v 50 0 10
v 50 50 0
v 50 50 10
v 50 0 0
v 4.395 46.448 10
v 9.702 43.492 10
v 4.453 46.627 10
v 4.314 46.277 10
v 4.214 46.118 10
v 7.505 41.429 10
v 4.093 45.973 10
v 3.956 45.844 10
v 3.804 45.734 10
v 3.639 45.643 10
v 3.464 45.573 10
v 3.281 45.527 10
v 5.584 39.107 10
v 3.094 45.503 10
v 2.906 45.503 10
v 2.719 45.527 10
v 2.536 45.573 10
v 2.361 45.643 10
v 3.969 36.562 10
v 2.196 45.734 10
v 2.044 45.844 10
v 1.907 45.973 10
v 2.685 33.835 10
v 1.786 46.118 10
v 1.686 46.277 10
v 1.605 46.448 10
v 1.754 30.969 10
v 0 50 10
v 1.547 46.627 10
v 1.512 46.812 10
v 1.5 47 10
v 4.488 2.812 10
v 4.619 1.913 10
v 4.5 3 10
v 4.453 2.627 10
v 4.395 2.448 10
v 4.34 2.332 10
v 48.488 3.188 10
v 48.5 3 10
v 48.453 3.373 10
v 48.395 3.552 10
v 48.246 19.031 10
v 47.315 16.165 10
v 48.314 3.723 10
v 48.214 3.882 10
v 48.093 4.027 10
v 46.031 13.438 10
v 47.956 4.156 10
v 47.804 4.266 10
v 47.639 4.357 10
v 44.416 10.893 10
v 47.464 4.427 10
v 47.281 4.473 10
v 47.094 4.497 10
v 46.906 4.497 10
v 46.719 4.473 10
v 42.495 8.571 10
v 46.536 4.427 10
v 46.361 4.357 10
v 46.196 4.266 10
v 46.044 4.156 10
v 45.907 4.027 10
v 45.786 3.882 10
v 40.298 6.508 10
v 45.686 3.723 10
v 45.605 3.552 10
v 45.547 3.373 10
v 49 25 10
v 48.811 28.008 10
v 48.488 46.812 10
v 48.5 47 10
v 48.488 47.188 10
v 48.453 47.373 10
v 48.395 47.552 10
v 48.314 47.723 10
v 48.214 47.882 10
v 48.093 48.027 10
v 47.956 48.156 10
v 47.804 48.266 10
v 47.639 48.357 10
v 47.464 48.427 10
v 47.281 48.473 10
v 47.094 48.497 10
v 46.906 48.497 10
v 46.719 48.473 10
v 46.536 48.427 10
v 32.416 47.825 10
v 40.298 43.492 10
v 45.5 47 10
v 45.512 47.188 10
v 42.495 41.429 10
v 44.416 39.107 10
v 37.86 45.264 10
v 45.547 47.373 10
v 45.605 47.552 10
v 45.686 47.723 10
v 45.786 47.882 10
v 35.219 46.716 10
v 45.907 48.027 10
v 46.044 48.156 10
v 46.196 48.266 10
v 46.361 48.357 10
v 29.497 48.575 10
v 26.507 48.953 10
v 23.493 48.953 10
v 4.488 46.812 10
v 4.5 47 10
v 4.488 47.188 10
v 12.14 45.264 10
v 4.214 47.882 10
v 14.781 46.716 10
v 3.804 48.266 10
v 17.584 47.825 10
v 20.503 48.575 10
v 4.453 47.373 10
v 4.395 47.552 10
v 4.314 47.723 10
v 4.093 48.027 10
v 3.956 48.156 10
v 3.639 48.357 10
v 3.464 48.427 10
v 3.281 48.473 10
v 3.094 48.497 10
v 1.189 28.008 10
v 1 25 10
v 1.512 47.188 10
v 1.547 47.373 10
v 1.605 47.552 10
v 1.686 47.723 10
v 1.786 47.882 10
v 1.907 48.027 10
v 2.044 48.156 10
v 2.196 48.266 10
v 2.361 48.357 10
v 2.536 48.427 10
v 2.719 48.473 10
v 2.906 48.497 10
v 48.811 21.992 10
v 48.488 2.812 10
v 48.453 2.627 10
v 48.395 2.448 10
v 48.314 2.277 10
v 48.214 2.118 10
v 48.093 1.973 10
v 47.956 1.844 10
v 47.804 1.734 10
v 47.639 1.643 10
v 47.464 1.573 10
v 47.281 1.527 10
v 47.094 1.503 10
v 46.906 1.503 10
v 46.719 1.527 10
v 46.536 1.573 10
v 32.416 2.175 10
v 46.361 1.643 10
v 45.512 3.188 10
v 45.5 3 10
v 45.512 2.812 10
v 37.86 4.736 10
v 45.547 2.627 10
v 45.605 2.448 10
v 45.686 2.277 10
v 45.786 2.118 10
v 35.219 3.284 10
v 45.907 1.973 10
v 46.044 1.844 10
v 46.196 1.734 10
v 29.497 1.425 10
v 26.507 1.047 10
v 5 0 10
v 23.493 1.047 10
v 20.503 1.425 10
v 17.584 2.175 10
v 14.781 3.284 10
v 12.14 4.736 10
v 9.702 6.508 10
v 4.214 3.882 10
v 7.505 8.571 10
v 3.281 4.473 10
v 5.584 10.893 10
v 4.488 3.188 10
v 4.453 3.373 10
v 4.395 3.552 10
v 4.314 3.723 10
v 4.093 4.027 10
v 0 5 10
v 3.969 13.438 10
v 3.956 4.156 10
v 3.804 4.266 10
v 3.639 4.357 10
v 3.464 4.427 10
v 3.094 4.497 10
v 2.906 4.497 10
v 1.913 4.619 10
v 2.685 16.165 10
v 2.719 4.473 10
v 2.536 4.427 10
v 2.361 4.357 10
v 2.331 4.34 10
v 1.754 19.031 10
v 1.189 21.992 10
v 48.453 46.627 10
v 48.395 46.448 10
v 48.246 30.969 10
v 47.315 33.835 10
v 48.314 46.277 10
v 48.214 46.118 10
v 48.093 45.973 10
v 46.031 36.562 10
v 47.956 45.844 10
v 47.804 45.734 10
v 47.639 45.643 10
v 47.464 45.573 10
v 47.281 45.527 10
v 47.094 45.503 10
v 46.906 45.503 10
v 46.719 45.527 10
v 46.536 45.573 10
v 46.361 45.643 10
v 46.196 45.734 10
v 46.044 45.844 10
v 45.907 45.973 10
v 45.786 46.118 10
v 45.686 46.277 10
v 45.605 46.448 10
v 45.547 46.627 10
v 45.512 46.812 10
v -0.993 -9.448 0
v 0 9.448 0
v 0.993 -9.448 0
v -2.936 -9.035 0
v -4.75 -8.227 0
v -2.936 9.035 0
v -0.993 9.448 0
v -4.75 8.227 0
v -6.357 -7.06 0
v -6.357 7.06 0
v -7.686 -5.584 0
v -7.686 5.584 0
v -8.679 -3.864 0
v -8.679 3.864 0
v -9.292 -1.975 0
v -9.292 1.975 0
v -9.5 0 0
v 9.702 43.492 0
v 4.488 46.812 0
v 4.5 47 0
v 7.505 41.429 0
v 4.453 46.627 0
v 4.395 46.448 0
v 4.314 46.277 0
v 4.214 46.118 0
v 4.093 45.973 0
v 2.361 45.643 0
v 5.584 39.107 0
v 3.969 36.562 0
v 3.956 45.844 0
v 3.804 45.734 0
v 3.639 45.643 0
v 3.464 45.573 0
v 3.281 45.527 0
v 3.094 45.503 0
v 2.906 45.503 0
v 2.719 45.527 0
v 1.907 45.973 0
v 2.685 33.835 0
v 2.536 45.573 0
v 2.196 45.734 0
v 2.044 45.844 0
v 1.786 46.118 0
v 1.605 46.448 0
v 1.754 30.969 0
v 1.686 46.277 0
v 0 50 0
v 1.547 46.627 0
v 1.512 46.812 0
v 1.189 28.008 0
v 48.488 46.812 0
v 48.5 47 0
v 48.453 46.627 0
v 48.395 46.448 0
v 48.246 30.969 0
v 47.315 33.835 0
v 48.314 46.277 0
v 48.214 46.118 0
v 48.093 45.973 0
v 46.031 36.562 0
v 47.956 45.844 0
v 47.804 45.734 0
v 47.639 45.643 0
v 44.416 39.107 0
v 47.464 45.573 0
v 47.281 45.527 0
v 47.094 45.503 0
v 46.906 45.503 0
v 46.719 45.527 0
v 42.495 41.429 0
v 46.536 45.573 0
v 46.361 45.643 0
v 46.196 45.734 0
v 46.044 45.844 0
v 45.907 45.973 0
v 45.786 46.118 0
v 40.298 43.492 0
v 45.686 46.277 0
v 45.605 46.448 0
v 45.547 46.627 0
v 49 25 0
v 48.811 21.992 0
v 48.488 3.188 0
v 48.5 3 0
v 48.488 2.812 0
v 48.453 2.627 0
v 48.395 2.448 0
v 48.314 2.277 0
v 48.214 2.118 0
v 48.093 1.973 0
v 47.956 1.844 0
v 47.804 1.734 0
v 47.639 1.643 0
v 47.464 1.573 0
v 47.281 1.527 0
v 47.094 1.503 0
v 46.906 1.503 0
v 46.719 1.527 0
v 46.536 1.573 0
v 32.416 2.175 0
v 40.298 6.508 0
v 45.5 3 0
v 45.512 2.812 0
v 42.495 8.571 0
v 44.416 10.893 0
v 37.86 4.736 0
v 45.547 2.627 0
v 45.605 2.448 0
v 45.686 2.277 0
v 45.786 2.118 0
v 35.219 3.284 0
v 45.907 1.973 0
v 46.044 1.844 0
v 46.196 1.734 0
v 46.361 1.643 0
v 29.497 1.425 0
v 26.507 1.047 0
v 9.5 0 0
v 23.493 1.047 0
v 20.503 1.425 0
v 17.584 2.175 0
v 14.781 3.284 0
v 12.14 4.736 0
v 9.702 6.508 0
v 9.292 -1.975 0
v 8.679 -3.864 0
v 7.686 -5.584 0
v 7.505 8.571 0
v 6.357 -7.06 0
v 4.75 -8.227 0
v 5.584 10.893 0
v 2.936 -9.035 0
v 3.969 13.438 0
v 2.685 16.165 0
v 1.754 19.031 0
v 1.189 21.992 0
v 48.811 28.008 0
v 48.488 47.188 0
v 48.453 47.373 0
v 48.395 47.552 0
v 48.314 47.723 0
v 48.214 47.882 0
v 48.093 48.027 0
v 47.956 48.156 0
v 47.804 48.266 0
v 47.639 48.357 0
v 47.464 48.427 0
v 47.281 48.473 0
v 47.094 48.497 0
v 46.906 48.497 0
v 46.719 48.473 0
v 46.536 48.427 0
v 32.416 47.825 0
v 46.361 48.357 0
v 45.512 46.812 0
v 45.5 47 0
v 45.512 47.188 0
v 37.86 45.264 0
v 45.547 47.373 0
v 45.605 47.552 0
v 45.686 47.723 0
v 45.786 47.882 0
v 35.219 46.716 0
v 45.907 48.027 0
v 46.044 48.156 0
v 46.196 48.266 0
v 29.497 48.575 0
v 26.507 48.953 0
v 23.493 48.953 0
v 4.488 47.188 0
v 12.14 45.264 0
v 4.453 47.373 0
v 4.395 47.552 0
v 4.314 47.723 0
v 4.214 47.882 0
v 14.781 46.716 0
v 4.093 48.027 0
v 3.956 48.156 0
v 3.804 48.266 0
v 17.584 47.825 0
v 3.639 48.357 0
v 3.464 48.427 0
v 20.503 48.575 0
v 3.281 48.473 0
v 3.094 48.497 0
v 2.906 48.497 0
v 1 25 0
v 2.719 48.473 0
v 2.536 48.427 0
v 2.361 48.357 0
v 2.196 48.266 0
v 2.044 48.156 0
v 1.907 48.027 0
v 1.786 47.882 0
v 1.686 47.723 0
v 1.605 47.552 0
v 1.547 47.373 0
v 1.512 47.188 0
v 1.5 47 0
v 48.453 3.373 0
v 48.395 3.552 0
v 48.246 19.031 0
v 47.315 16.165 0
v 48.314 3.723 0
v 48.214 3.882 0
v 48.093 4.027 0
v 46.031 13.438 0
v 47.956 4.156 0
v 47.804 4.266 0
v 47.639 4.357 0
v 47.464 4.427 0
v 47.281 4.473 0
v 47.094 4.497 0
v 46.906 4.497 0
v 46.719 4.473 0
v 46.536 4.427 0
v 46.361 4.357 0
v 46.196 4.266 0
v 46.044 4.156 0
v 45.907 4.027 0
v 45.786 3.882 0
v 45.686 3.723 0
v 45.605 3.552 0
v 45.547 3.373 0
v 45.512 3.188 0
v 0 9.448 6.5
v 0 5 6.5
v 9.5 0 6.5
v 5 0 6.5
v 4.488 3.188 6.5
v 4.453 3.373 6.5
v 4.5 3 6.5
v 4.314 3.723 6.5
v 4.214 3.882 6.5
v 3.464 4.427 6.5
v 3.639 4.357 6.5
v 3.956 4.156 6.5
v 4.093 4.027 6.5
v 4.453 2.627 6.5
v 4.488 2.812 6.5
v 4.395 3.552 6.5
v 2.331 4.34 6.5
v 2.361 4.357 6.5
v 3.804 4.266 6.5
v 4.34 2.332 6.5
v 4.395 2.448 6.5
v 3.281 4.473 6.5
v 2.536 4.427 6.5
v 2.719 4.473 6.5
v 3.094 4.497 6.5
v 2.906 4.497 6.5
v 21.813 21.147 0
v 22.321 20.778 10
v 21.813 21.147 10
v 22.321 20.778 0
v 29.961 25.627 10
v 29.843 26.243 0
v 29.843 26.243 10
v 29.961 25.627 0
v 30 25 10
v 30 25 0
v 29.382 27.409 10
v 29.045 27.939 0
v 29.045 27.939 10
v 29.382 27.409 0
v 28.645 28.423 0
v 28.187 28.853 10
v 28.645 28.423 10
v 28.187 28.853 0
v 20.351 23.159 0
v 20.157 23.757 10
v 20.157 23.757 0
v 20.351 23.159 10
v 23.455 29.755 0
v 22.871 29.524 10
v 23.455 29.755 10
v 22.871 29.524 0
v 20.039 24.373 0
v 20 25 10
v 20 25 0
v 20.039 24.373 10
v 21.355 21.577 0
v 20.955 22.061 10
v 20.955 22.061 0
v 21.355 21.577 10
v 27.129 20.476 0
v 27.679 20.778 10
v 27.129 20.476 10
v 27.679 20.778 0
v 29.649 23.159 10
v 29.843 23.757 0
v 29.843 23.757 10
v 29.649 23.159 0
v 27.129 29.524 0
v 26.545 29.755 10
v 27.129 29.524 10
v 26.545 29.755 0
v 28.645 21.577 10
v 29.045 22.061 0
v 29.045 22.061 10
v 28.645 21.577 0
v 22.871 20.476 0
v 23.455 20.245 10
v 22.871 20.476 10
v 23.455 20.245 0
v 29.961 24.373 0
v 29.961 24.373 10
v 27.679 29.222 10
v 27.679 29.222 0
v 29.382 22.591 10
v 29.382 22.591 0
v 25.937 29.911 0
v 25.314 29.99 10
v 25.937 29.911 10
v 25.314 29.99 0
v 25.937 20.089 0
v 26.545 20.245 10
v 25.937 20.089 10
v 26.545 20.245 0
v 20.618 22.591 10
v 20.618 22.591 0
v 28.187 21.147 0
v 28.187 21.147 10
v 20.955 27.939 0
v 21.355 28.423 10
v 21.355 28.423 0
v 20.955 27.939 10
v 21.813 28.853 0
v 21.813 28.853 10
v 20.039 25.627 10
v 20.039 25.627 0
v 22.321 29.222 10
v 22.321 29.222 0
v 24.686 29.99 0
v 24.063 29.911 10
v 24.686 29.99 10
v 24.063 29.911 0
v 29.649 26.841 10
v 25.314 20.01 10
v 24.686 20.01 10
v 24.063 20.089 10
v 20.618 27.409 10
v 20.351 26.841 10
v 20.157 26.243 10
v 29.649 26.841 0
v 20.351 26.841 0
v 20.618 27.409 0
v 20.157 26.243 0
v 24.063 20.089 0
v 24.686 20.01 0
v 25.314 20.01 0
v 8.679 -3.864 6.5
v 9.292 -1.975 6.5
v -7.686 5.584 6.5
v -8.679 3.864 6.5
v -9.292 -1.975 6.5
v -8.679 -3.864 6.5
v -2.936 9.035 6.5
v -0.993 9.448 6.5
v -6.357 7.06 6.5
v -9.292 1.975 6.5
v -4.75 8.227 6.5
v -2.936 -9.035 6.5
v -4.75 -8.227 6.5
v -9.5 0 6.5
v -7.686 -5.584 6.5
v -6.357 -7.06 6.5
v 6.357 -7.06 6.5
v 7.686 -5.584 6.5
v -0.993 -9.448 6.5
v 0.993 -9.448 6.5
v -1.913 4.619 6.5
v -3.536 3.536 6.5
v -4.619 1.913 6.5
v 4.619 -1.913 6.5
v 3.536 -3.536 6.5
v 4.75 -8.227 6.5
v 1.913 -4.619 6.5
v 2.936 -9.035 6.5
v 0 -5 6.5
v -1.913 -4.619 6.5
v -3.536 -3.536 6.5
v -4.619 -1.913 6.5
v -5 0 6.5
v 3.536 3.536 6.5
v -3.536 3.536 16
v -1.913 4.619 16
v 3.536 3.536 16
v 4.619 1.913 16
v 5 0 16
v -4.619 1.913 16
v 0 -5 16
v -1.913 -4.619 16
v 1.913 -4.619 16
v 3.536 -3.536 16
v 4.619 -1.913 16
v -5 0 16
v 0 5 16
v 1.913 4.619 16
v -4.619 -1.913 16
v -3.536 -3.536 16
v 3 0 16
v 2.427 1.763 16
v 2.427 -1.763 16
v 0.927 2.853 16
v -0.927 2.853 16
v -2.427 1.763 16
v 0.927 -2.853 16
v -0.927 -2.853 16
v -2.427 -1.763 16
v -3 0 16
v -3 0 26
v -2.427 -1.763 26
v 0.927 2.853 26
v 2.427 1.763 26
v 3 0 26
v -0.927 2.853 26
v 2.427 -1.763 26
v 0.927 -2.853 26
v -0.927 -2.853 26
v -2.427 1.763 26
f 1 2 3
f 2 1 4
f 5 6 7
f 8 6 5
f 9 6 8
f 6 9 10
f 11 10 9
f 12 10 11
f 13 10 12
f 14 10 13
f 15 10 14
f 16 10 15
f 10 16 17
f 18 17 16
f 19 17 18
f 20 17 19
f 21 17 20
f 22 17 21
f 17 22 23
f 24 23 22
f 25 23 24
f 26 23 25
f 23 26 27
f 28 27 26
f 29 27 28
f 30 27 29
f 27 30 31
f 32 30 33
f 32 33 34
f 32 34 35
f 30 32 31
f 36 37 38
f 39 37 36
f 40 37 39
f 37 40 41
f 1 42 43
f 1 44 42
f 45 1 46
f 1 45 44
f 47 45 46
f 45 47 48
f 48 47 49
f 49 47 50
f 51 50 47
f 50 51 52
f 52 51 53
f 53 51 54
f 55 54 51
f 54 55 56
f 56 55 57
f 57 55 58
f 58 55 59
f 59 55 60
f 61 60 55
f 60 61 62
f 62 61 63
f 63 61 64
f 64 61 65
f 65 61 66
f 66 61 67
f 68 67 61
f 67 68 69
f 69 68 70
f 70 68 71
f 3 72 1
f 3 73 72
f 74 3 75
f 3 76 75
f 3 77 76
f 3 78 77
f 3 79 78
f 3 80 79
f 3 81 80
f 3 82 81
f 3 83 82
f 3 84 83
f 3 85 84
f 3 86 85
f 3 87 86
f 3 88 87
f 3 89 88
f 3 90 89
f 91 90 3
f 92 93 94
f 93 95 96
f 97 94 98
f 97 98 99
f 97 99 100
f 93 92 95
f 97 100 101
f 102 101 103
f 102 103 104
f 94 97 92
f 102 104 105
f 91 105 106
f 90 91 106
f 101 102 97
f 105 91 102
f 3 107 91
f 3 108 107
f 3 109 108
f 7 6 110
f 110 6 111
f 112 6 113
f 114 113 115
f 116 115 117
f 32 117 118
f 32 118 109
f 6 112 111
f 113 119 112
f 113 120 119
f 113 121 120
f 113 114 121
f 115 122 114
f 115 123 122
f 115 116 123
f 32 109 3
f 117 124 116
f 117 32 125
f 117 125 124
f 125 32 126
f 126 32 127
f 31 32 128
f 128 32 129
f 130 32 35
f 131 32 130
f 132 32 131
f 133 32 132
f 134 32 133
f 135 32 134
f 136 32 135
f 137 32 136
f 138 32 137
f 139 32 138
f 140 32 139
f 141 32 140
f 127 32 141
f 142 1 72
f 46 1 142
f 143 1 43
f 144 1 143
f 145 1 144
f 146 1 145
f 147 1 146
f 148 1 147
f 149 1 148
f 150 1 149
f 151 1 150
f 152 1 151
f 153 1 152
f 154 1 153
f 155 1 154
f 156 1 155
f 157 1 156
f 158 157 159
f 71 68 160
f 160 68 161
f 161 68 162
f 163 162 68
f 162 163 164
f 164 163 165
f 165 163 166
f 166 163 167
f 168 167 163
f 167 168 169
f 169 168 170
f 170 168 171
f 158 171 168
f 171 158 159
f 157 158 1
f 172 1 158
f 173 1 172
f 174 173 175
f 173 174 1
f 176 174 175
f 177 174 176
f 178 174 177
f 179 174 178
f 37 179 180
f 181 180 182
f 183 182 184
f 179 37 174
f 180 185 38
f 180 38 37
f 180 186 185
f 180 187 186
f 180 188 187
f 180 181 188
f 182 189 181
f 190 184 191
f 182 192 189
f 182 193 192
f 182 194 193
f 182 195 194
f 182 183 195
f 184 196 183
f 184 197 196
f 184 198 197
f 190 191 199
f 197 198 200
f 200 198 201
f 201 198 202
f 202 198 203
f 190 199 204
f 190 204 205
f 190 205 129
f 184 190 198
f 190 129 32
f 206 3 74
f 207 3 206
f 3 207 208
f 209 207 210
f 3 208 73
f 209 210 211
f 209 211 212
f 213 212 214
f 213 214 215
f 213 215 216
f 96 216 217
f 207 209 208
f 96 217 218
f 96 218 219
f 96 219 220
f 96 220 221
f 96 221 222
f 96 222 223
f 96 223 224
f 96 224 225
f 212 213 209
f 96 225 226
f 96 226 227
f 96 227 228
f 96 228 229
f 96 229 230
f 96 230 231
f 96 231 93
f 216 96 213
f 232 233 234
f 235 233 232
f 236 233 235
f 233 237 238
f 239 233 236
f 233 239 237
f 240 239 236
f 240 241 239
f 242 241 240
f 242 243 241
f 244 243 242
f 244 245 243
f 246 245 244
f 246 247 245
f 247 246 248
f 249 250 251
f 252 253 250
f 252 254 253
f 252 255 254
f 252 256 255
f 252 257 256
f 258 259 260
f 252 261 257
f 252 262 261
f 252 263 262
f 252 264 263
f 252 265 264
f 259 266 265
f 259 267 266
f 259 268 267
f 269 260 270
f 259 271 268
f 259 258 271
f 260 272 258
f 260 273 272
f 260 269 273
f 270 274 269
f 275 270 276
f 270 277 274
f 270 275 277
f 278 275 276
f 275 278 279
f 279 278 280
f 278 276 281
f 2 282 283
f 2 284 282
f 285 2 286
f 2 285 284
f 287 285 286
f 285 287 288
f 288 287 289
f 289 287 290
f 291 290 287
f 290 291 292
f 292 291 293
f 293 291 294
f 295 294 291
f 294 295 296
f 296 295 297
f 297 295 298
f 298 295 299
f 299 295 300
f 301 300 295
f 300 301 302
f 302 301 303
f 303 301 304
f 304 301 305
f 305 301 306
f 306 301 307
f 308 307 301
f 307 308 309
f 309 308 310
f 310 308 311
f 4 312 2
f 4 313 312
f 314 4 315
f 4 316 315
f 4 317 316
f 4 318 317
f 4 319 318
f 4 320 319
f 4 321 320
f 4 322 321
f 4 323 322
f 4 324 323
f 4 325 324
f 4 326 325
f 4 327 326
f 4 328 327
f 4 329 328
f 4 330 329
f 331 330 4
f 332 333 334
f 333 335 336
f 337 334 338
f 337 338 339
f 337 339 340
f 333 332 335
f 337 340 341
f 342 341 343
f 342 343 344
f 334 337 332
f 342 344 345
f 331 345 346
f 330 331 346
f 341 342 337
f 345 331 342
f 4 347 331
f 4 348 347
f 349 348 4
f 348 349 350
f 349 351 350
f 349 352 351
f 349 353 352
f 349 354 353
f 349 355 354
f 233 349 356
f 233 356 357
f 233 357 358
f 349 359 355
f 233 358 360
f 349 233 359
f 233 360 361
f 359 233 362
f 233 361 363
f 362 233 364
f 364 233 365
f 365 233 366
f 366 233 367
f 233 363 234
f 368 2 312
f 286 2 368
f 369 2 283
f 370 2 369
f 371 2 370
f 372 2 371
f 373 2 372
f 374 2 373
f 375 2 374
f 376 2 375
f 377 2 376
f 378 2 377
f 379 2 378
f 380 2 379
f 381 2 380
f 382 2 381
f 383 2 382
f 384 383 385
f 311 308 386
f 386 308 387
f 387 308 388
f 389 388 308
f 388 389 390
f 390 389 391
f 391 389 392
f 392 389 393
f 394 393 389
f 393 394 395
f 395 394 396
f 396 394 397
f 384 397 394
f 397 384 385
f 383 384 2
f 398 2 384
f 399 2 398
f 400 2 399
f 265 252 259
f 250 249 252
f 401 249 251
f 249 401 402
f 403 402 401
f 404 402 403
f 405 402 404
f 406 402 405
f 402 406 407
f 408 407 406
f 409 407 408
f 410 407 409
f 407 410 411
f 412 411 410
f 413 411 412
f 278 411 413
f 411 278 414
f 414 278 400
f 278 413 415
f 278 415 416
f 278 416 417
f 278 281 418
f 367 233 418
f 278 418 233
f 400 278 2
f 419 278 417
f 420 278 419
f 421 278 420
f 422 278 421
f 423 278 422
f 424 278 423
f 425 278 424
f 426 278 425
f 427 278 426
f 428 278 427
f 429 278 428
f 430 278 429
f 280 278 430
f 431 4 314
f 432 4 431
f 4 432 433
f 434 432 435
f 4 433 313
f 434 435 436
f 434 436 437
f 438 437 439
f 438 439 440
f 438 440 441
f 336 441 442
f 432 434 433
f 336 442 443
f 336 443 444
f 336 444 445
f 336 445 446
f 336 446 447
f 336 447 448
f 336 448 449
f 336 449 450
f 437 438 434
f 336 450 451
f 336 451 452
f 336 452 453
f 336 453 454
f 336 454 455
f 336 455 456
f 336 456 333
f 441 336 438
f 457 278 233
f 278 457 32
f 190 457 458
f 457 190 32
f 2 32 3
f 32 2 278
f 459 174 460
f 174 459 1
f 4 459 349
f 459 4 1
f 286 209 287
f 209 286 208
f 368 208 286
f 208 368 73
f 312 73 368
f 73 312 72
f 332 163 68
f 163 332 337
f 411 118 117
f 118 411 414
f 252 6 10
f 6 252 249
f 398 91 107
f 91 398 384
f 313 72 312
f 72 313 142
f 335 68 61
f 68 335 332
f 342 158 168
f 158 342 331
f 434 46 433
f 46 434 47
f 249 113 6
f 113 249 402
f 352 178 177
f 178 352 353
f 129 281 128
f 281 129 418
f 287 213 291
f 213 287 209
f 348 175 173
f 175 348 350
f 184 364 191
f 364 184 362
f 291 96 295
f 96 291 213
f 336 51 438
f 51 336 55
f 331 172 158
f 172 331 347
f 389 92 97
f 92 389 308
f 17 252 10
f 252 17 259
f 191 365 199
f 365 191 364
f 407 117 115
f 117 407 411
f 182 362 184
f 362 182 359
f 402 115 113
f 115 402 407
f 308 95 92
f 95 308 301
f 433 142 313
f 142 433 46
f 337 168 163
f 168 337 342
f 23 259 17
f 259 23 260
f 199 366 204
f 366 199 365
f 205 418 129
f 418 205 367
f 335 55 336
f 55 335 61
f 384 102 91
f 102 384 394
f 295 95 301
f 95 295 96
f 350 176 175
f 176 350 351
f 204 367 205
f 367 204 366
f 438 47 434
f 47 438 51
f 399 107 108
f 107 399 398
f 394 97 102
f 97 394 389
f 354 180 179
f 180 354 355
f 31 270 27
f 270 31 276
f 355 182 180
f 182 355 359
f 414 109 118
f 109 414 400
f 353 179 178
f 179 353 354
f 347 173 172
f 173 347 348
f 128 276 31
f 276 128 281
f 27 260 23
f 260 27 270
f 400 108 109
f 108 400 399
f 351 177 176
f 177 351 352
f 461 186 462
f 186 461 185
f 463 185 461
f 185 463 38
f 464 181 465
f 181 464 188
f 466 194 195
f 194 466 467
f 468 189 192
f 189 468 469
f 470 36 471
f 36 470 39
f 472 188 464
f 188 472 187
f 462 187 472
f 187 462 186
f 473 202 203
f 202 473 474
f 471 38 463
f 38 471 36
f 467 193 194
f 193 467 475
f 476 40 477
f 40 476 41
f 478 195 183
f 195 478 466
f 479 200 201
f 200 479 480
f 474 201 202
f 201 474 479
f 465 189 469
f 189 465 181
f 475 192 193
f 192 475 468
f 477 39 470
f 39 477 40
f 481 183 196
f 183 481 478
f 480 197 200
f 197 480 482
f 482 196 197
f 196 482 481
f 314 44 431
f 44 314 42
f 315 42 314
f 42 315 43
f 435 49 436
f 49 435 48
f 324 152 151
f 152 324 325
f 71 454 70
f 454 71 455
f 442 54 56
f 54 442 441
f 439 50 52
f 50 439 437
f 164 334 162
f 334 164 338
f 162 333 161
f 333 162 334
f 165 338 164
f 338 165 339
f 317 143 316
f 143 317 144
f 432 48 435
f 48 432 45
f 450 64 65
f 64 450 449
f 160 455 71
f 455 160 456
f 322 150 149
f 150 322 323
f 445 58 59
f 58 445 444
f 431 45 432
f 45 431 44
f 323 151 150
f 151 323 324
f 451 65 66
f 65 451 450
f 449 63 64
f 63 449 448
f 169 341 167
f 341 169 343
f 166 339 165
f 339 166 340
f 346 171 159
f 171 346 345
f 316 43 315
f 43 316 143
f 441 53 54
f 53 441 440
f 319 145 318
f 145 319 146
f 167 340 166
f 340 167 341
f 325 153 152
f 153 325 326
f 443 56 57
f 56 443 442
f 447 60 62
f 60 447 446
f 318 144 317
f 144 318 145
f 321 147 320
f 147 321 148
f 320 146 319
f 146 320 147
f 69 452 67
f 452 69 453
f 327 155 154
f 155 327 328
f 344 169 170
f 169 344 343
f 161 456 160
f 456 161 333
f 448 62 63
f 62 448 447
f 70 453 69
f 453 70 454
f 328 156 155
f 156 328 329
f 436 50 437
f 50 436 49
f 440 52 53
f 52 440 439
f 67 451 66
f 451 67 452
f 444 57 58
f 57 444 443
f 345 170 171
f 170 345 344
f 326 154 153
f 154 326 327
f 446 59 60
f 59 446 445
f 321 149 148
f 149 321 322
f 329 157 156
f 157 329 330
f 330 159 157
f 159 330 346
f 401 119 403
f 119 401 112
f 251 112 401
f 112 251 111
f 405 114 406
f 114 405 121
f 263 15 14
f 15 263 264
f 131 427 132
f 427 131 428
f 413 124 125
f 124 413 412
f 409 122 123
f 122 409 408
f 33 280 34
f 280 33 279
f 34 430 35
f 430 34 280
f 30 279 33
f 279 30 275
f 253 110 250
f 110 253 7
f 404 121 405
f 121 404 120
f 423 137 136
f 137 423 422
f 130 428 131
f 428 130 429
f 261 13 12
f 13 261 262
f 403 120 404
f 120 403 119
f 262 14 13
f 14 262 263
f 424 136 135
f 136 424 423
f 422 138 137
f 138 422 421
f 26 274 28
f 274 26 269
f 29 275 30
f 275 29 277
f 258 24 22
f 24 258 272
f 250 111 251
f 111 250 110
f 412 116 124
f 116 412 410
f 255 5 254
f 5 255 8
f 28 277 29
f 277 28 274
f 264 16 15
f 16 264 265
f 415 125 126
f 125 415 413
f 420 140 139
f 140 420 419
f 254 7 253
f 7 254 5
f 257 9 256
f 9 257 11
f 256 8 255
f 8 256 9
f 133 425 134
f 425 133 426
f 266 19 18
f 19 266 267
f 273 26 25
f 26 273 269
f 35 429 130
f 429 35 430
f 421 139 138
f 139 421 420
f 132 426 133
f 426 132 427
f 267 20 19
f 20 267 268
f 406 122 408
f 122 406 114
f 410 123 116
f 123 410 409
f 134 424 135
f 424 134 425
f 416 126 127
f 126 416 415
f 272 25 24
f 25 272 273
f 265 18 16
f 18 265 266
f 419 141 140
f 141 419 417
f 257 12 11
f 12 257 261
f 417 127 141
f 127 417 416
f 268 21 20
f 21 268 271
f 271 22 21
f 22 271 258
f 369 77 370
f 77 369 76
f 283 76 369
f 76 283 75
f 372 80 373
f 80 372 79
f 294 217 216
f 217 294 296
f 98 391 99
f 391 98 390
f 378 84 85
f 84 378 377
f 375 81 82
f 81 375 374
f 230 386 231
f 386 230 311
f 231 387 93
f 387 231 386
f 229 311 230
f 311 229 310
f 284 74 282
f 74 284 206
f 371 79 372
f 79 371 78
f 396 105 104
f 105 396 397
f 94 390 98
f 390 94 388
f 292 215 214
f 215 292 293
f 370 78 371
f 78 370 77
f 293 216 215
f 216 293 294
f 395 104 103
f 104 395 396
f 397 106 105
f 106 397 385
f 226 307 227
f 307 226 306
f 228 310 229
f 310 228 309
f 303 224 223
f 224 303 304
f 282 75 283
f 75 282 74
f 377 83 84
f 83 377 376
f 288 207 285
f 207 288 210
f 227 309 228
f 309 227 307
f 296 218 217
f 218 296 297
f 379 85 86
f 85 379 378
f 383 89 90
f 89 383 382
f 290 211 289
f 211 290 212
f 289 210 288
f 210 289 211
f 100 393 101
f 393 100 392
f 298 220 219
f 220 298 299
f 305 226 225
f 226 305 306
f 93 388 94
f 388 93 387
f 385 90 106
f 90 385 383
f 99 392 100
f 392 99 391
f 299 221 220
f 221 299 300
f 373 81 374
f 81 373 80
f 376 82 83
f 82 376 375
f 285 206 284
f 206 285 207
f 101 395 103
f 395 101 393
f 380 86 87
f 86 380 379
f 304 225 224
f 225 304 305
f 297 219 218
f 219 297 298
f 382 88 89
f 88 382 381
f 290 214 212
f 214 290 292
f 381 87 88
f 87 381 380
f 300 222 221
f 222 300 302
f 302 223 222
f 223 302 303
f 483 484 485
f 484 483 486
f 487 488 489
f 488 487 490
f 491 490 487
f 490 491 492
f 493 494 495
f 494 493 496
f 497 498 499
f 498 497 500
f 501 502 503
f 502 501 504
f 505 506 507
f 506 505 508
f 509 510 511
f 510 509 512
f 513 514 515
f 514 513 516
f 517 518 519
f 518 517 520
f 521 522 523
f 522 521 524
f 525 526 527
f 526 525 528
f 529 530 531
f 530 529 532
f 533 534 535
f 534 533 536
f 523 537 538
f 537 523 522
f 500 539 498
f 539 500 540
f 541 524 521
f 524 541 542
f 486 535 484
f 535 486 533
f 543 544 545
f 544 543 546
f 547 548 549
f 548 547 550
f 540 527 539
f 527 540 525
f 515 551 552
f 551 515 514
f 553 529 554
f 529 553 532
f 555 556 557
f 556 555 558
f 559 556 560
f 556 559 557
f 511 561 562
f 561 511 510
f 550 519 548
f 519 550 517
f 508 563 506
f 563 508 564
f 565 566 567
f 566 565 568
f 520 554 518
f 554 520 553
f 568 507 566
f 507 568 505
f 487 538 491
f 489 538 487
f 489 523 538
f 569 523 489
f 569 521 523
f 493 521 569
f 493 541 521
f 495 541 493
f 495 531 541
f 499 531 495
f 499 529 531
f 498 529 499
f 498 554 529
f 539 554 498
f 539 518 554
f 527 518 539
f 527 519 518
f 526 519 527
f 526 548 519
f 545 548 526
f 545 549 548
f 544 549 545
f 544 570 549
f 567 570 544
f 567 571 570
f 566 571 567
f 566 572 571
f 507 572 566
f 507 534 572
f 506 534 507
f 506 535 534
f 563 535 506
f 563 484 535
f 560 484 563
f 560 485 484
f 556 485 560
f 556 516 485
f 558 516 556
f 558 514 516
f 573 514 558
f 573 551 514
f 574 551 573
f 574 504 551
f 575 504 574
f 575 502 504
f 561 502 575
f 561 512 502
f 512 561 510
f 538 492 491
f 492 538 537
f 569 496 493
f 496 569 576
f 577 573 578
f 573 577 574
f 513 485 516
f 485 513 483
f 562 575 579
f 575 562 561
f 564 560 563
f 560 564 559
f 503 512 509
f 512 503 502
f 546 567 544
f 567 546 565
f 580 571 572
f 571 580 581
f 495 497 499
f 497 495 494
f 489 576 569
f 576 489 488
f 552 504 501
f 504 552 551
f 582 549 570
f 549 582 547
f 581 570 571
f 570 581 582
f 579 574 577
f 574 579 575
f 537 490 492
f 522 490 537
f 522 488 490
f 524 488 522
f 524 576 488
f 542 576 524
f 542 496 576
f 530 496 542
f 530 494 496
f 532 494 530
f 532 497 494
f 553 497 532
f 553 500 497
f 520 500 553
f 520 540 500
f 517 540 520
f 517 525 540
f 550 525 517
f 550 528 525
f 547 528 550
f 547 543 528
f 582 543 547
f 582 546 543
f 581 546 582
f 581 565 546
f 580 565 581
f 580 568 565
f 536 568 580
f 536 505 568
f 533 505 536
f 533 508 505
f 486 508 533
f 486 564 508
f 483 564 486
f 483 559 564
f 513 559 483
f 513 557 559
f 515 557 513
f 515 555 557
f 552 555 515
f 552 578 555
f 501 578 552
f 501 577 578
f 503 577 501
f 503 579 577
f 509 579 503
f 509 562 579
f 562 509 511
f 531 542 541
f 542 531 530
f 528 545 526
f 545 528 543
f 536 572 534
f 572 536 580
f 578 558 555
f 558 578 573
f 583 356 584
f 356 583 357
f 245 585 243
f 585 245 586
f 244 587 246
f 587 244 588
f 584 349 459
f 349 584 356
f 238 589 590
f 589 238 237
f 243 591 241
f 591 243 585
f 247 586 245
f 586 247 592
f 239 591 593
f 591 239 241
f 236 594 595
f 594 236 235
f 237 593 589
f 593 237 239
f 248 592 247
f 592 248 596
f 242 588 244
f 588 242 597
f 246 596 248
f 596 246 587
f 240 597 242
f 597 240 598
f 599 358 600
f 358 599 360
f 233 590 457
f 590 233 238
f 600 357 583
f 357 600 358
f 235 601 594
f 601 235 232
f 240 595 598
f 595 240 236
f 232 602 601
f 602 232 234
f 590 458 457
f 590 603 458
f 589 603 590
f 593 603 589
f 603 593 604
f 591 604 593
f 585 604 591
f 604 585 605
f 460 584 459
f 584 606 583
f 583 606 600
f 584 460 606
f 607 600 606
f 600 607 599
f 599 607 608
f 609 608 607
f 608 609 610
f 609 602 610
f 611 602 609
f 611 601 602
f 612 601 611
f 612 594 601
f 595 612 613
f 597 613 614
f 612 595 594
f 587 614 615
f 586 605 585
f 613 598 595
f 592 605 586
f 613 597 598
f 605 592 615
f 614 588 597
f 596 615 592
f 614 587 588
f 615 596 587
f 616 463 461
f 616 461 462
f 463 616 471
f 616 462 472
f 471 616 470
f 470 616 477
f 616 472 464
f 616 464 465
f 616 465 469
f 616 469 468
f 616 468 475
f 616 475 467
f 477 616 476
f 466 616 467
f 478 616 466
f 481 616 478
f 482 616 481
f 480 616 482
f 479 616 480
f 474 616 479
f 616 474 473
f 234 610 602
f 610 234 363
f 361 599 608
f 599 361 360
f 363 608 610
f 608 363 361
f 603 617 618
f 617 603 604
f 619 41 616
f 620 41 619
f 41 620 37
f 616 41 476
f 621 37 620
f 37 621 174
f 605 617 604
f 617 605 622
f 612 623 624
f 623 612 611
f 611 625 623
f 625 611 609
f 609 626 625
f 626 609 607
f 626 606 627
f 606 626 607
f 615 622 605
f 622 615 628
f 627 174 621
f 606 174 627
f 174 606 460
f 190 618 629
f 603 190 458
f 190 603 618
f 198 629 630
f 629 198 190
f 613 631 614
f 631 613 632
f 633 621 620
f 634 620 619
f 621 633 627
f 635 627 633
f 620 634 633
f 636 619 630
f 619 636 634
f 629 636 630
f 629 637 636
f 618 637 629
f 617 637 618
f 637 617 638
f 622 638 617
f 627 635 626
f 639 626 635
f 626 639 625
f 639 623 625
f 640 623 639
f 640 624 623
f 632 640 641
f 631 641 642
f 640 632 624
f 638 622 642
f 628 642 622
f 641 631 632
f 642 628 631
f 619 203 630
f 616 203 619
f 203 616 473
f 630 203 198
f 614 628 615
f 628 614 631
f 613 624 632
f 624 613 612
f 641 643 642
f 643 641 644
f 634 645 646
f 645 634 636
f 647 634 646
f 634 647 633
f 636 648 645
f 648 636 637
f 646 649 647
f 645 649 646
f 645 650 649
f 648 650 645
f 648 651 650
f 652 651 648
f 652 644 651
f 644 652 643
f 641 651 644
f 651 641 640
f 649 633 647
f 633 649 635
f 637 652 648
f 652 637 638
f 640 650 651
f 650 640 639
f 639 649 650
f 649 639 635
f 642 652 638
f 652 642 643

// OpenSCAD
// file: tolerance.scad
// Author: Mihai Oltean, https://mihaioltean.github.io, mihai.oltean@gmail.com
// More details: https://jenny5.org, https://jenny5-robot.github.io/
// Source code: github.com/jenny5-robot
// MIT License
//--------------------------------------------------------------

tolerance = 0.1;
display_tolerance = 1;

overlap_tolerance = 0.01;

tolerance_z = [0, 0, tolerance];
tolerance_x = [tolerance, 0, 0];
tolerance_y = [0, tolerance, 0];

display_tolerance_z = [0, 0, display_tolerance];
display_tolerance_x = [display_tolerance, 0, 0];
display_tolerance_y = [0, display_tolerance, 0];

display_tolerance_xz = [display_tolerance, 0, display_tolerance];
display_tolerance_xy = [display_tolerance, display_tolerance, 0];
display_tolerance_yz = [0, display_tolerance, display_tolerance];

display_tolerance_xyz = [display_tolerance, display_tolerance, display_tolerance];
// file: params_electronic_components.scad
// Author: Mihai Oltean, https://mihaioltean.github.io, mihai.oltean@gmail.com
// More details: https://jenny5.org, https://jenny5-robot.github.io/
// Source code: github.com/jenny5-robot
// MIT License
//-------------------------------------------------------------- 

a4988_size = [21, 15, 11];
// file: params_basic_components.scad
// Author: Mihai Oltean, https://mihaioltean.github.io, mihai.oltean@gmail.com
// More details: https://jenny5.org, https://jenny5-robot.github.io/
// Source code: github.com/jenny5-robot
// MIT License
//--------------------------------------------------------------

spring_length = 20;

smooth_rod_8_radius = 4;
smooth_rod_10_radius = 5;
smooth_rod_12_radius = 6;

wall_thick_1 = 1;
wall_thick_2 = 2;
wall_thick_3 = 3;
wall_thick_4 = 4;
wall_thick_5 = 5;
wall_thick_5_5 = 5.5;
wall_thick_6 = 6;
wall_thick_7 = 7;
wall_thick_8 = 8;
wall_thick_9 = 9;
wall_thick_10 = 10;
wall_thick_12 = 12;
// main file
// Author: Mihai Oltean, https://mihaioltean.github.io, mihai.oltean@gmail.com
// More details: https://jenny5.org, https://jenny5-robot.github.io/
// Source code: github.com/jenny5-robot
// MIT License
//--------------------------------------------------------------

include <params_basic_components.scad>
include <params_electronic_components.scad>
include <tolerance.scad>

//--------------------------------------------------------------------
module potentiometer()
{
    cylinder (h = 6.5, r= 9.5);
    
    translate ([0, 0, 6]) cylinder (h = 10, r = 5);
    translate ([0, 0, 16]) cylinder (h = 10, r = 3);
    
}
//--------------------------------------------------------------------
module fan(latura, inaltime)
{
	difference(){
		color ("Black") cube([latura, latura, inaltime]);
		translate ([latura / 2, latura / 2, 0] - display_tolerance_z) cylinder(h = inaltime + 2 * display_tolerance, r = latura / 2 - 1, $fn = 50);
		// 4 small holes
		translate ([3, 3, 0] - display_tolerance_z) cylinder(h = inaltime + 2 * display_tolerance, r = 1.5, $fn = 50);
		translate ([latura - 3, 3, 0] - display_tolerance_z) cylinder(h = inaltime + 2 * display_tolerance, r = 1.5, $fn = 50);
		translate ([3, latura - 3, 0] - display_tolerance_z) cylinder(h = inaltime + 2 * display_tolerance, r = 1.5, $fn = 50);
		translate ([latura - 3, latura - 3, 0] - display_tolerance_z) cylinder(h = inaltime + 2 * display_tolerance, r = 1.5, $fn = 50);
		
	}
	color ("Black") translate ([latura / 2, latura / 2, 0]) cylinder (h = inaltime, r= 5, $fn = 50);
}
//--------------------------------------------------------------------
module heat_sink(external_radius, internal_radius, number_of_wings)
{
	heatsink_wing_height = 1;
	difference(){
		union(){
			cylinder ( h = heatsink_wing_height, r = external_radius, $fn = 50);
			for (i = [1:number_of_wings - 1]){
				translate ([0, 0, (2 * i - 1) * heatsink_wing_height]) cylinder ( h = heatsink_wing_height, r = internal_radius + 1, $fn = 50);
				translate ([0, 0, 2 * i * heatsink_wing_height]) cylinder ( h = heatsink_wing_height, r = external_radius, $fn = 50);
			}
		}
		translate ([0, 0, -tolerance]) cylinder ( h = (2 * number_of_wings  - 1) * heatsink_wing_height + 2 * tolerance, r = internal_radius, $fn = 50);
	}
}
//--------------------------------------------------------------
module a4988()
{
    color("green") cube(a4988_size);
}
//--------------------------------------------------------------------

fan(50, 10);

potentiometer();
